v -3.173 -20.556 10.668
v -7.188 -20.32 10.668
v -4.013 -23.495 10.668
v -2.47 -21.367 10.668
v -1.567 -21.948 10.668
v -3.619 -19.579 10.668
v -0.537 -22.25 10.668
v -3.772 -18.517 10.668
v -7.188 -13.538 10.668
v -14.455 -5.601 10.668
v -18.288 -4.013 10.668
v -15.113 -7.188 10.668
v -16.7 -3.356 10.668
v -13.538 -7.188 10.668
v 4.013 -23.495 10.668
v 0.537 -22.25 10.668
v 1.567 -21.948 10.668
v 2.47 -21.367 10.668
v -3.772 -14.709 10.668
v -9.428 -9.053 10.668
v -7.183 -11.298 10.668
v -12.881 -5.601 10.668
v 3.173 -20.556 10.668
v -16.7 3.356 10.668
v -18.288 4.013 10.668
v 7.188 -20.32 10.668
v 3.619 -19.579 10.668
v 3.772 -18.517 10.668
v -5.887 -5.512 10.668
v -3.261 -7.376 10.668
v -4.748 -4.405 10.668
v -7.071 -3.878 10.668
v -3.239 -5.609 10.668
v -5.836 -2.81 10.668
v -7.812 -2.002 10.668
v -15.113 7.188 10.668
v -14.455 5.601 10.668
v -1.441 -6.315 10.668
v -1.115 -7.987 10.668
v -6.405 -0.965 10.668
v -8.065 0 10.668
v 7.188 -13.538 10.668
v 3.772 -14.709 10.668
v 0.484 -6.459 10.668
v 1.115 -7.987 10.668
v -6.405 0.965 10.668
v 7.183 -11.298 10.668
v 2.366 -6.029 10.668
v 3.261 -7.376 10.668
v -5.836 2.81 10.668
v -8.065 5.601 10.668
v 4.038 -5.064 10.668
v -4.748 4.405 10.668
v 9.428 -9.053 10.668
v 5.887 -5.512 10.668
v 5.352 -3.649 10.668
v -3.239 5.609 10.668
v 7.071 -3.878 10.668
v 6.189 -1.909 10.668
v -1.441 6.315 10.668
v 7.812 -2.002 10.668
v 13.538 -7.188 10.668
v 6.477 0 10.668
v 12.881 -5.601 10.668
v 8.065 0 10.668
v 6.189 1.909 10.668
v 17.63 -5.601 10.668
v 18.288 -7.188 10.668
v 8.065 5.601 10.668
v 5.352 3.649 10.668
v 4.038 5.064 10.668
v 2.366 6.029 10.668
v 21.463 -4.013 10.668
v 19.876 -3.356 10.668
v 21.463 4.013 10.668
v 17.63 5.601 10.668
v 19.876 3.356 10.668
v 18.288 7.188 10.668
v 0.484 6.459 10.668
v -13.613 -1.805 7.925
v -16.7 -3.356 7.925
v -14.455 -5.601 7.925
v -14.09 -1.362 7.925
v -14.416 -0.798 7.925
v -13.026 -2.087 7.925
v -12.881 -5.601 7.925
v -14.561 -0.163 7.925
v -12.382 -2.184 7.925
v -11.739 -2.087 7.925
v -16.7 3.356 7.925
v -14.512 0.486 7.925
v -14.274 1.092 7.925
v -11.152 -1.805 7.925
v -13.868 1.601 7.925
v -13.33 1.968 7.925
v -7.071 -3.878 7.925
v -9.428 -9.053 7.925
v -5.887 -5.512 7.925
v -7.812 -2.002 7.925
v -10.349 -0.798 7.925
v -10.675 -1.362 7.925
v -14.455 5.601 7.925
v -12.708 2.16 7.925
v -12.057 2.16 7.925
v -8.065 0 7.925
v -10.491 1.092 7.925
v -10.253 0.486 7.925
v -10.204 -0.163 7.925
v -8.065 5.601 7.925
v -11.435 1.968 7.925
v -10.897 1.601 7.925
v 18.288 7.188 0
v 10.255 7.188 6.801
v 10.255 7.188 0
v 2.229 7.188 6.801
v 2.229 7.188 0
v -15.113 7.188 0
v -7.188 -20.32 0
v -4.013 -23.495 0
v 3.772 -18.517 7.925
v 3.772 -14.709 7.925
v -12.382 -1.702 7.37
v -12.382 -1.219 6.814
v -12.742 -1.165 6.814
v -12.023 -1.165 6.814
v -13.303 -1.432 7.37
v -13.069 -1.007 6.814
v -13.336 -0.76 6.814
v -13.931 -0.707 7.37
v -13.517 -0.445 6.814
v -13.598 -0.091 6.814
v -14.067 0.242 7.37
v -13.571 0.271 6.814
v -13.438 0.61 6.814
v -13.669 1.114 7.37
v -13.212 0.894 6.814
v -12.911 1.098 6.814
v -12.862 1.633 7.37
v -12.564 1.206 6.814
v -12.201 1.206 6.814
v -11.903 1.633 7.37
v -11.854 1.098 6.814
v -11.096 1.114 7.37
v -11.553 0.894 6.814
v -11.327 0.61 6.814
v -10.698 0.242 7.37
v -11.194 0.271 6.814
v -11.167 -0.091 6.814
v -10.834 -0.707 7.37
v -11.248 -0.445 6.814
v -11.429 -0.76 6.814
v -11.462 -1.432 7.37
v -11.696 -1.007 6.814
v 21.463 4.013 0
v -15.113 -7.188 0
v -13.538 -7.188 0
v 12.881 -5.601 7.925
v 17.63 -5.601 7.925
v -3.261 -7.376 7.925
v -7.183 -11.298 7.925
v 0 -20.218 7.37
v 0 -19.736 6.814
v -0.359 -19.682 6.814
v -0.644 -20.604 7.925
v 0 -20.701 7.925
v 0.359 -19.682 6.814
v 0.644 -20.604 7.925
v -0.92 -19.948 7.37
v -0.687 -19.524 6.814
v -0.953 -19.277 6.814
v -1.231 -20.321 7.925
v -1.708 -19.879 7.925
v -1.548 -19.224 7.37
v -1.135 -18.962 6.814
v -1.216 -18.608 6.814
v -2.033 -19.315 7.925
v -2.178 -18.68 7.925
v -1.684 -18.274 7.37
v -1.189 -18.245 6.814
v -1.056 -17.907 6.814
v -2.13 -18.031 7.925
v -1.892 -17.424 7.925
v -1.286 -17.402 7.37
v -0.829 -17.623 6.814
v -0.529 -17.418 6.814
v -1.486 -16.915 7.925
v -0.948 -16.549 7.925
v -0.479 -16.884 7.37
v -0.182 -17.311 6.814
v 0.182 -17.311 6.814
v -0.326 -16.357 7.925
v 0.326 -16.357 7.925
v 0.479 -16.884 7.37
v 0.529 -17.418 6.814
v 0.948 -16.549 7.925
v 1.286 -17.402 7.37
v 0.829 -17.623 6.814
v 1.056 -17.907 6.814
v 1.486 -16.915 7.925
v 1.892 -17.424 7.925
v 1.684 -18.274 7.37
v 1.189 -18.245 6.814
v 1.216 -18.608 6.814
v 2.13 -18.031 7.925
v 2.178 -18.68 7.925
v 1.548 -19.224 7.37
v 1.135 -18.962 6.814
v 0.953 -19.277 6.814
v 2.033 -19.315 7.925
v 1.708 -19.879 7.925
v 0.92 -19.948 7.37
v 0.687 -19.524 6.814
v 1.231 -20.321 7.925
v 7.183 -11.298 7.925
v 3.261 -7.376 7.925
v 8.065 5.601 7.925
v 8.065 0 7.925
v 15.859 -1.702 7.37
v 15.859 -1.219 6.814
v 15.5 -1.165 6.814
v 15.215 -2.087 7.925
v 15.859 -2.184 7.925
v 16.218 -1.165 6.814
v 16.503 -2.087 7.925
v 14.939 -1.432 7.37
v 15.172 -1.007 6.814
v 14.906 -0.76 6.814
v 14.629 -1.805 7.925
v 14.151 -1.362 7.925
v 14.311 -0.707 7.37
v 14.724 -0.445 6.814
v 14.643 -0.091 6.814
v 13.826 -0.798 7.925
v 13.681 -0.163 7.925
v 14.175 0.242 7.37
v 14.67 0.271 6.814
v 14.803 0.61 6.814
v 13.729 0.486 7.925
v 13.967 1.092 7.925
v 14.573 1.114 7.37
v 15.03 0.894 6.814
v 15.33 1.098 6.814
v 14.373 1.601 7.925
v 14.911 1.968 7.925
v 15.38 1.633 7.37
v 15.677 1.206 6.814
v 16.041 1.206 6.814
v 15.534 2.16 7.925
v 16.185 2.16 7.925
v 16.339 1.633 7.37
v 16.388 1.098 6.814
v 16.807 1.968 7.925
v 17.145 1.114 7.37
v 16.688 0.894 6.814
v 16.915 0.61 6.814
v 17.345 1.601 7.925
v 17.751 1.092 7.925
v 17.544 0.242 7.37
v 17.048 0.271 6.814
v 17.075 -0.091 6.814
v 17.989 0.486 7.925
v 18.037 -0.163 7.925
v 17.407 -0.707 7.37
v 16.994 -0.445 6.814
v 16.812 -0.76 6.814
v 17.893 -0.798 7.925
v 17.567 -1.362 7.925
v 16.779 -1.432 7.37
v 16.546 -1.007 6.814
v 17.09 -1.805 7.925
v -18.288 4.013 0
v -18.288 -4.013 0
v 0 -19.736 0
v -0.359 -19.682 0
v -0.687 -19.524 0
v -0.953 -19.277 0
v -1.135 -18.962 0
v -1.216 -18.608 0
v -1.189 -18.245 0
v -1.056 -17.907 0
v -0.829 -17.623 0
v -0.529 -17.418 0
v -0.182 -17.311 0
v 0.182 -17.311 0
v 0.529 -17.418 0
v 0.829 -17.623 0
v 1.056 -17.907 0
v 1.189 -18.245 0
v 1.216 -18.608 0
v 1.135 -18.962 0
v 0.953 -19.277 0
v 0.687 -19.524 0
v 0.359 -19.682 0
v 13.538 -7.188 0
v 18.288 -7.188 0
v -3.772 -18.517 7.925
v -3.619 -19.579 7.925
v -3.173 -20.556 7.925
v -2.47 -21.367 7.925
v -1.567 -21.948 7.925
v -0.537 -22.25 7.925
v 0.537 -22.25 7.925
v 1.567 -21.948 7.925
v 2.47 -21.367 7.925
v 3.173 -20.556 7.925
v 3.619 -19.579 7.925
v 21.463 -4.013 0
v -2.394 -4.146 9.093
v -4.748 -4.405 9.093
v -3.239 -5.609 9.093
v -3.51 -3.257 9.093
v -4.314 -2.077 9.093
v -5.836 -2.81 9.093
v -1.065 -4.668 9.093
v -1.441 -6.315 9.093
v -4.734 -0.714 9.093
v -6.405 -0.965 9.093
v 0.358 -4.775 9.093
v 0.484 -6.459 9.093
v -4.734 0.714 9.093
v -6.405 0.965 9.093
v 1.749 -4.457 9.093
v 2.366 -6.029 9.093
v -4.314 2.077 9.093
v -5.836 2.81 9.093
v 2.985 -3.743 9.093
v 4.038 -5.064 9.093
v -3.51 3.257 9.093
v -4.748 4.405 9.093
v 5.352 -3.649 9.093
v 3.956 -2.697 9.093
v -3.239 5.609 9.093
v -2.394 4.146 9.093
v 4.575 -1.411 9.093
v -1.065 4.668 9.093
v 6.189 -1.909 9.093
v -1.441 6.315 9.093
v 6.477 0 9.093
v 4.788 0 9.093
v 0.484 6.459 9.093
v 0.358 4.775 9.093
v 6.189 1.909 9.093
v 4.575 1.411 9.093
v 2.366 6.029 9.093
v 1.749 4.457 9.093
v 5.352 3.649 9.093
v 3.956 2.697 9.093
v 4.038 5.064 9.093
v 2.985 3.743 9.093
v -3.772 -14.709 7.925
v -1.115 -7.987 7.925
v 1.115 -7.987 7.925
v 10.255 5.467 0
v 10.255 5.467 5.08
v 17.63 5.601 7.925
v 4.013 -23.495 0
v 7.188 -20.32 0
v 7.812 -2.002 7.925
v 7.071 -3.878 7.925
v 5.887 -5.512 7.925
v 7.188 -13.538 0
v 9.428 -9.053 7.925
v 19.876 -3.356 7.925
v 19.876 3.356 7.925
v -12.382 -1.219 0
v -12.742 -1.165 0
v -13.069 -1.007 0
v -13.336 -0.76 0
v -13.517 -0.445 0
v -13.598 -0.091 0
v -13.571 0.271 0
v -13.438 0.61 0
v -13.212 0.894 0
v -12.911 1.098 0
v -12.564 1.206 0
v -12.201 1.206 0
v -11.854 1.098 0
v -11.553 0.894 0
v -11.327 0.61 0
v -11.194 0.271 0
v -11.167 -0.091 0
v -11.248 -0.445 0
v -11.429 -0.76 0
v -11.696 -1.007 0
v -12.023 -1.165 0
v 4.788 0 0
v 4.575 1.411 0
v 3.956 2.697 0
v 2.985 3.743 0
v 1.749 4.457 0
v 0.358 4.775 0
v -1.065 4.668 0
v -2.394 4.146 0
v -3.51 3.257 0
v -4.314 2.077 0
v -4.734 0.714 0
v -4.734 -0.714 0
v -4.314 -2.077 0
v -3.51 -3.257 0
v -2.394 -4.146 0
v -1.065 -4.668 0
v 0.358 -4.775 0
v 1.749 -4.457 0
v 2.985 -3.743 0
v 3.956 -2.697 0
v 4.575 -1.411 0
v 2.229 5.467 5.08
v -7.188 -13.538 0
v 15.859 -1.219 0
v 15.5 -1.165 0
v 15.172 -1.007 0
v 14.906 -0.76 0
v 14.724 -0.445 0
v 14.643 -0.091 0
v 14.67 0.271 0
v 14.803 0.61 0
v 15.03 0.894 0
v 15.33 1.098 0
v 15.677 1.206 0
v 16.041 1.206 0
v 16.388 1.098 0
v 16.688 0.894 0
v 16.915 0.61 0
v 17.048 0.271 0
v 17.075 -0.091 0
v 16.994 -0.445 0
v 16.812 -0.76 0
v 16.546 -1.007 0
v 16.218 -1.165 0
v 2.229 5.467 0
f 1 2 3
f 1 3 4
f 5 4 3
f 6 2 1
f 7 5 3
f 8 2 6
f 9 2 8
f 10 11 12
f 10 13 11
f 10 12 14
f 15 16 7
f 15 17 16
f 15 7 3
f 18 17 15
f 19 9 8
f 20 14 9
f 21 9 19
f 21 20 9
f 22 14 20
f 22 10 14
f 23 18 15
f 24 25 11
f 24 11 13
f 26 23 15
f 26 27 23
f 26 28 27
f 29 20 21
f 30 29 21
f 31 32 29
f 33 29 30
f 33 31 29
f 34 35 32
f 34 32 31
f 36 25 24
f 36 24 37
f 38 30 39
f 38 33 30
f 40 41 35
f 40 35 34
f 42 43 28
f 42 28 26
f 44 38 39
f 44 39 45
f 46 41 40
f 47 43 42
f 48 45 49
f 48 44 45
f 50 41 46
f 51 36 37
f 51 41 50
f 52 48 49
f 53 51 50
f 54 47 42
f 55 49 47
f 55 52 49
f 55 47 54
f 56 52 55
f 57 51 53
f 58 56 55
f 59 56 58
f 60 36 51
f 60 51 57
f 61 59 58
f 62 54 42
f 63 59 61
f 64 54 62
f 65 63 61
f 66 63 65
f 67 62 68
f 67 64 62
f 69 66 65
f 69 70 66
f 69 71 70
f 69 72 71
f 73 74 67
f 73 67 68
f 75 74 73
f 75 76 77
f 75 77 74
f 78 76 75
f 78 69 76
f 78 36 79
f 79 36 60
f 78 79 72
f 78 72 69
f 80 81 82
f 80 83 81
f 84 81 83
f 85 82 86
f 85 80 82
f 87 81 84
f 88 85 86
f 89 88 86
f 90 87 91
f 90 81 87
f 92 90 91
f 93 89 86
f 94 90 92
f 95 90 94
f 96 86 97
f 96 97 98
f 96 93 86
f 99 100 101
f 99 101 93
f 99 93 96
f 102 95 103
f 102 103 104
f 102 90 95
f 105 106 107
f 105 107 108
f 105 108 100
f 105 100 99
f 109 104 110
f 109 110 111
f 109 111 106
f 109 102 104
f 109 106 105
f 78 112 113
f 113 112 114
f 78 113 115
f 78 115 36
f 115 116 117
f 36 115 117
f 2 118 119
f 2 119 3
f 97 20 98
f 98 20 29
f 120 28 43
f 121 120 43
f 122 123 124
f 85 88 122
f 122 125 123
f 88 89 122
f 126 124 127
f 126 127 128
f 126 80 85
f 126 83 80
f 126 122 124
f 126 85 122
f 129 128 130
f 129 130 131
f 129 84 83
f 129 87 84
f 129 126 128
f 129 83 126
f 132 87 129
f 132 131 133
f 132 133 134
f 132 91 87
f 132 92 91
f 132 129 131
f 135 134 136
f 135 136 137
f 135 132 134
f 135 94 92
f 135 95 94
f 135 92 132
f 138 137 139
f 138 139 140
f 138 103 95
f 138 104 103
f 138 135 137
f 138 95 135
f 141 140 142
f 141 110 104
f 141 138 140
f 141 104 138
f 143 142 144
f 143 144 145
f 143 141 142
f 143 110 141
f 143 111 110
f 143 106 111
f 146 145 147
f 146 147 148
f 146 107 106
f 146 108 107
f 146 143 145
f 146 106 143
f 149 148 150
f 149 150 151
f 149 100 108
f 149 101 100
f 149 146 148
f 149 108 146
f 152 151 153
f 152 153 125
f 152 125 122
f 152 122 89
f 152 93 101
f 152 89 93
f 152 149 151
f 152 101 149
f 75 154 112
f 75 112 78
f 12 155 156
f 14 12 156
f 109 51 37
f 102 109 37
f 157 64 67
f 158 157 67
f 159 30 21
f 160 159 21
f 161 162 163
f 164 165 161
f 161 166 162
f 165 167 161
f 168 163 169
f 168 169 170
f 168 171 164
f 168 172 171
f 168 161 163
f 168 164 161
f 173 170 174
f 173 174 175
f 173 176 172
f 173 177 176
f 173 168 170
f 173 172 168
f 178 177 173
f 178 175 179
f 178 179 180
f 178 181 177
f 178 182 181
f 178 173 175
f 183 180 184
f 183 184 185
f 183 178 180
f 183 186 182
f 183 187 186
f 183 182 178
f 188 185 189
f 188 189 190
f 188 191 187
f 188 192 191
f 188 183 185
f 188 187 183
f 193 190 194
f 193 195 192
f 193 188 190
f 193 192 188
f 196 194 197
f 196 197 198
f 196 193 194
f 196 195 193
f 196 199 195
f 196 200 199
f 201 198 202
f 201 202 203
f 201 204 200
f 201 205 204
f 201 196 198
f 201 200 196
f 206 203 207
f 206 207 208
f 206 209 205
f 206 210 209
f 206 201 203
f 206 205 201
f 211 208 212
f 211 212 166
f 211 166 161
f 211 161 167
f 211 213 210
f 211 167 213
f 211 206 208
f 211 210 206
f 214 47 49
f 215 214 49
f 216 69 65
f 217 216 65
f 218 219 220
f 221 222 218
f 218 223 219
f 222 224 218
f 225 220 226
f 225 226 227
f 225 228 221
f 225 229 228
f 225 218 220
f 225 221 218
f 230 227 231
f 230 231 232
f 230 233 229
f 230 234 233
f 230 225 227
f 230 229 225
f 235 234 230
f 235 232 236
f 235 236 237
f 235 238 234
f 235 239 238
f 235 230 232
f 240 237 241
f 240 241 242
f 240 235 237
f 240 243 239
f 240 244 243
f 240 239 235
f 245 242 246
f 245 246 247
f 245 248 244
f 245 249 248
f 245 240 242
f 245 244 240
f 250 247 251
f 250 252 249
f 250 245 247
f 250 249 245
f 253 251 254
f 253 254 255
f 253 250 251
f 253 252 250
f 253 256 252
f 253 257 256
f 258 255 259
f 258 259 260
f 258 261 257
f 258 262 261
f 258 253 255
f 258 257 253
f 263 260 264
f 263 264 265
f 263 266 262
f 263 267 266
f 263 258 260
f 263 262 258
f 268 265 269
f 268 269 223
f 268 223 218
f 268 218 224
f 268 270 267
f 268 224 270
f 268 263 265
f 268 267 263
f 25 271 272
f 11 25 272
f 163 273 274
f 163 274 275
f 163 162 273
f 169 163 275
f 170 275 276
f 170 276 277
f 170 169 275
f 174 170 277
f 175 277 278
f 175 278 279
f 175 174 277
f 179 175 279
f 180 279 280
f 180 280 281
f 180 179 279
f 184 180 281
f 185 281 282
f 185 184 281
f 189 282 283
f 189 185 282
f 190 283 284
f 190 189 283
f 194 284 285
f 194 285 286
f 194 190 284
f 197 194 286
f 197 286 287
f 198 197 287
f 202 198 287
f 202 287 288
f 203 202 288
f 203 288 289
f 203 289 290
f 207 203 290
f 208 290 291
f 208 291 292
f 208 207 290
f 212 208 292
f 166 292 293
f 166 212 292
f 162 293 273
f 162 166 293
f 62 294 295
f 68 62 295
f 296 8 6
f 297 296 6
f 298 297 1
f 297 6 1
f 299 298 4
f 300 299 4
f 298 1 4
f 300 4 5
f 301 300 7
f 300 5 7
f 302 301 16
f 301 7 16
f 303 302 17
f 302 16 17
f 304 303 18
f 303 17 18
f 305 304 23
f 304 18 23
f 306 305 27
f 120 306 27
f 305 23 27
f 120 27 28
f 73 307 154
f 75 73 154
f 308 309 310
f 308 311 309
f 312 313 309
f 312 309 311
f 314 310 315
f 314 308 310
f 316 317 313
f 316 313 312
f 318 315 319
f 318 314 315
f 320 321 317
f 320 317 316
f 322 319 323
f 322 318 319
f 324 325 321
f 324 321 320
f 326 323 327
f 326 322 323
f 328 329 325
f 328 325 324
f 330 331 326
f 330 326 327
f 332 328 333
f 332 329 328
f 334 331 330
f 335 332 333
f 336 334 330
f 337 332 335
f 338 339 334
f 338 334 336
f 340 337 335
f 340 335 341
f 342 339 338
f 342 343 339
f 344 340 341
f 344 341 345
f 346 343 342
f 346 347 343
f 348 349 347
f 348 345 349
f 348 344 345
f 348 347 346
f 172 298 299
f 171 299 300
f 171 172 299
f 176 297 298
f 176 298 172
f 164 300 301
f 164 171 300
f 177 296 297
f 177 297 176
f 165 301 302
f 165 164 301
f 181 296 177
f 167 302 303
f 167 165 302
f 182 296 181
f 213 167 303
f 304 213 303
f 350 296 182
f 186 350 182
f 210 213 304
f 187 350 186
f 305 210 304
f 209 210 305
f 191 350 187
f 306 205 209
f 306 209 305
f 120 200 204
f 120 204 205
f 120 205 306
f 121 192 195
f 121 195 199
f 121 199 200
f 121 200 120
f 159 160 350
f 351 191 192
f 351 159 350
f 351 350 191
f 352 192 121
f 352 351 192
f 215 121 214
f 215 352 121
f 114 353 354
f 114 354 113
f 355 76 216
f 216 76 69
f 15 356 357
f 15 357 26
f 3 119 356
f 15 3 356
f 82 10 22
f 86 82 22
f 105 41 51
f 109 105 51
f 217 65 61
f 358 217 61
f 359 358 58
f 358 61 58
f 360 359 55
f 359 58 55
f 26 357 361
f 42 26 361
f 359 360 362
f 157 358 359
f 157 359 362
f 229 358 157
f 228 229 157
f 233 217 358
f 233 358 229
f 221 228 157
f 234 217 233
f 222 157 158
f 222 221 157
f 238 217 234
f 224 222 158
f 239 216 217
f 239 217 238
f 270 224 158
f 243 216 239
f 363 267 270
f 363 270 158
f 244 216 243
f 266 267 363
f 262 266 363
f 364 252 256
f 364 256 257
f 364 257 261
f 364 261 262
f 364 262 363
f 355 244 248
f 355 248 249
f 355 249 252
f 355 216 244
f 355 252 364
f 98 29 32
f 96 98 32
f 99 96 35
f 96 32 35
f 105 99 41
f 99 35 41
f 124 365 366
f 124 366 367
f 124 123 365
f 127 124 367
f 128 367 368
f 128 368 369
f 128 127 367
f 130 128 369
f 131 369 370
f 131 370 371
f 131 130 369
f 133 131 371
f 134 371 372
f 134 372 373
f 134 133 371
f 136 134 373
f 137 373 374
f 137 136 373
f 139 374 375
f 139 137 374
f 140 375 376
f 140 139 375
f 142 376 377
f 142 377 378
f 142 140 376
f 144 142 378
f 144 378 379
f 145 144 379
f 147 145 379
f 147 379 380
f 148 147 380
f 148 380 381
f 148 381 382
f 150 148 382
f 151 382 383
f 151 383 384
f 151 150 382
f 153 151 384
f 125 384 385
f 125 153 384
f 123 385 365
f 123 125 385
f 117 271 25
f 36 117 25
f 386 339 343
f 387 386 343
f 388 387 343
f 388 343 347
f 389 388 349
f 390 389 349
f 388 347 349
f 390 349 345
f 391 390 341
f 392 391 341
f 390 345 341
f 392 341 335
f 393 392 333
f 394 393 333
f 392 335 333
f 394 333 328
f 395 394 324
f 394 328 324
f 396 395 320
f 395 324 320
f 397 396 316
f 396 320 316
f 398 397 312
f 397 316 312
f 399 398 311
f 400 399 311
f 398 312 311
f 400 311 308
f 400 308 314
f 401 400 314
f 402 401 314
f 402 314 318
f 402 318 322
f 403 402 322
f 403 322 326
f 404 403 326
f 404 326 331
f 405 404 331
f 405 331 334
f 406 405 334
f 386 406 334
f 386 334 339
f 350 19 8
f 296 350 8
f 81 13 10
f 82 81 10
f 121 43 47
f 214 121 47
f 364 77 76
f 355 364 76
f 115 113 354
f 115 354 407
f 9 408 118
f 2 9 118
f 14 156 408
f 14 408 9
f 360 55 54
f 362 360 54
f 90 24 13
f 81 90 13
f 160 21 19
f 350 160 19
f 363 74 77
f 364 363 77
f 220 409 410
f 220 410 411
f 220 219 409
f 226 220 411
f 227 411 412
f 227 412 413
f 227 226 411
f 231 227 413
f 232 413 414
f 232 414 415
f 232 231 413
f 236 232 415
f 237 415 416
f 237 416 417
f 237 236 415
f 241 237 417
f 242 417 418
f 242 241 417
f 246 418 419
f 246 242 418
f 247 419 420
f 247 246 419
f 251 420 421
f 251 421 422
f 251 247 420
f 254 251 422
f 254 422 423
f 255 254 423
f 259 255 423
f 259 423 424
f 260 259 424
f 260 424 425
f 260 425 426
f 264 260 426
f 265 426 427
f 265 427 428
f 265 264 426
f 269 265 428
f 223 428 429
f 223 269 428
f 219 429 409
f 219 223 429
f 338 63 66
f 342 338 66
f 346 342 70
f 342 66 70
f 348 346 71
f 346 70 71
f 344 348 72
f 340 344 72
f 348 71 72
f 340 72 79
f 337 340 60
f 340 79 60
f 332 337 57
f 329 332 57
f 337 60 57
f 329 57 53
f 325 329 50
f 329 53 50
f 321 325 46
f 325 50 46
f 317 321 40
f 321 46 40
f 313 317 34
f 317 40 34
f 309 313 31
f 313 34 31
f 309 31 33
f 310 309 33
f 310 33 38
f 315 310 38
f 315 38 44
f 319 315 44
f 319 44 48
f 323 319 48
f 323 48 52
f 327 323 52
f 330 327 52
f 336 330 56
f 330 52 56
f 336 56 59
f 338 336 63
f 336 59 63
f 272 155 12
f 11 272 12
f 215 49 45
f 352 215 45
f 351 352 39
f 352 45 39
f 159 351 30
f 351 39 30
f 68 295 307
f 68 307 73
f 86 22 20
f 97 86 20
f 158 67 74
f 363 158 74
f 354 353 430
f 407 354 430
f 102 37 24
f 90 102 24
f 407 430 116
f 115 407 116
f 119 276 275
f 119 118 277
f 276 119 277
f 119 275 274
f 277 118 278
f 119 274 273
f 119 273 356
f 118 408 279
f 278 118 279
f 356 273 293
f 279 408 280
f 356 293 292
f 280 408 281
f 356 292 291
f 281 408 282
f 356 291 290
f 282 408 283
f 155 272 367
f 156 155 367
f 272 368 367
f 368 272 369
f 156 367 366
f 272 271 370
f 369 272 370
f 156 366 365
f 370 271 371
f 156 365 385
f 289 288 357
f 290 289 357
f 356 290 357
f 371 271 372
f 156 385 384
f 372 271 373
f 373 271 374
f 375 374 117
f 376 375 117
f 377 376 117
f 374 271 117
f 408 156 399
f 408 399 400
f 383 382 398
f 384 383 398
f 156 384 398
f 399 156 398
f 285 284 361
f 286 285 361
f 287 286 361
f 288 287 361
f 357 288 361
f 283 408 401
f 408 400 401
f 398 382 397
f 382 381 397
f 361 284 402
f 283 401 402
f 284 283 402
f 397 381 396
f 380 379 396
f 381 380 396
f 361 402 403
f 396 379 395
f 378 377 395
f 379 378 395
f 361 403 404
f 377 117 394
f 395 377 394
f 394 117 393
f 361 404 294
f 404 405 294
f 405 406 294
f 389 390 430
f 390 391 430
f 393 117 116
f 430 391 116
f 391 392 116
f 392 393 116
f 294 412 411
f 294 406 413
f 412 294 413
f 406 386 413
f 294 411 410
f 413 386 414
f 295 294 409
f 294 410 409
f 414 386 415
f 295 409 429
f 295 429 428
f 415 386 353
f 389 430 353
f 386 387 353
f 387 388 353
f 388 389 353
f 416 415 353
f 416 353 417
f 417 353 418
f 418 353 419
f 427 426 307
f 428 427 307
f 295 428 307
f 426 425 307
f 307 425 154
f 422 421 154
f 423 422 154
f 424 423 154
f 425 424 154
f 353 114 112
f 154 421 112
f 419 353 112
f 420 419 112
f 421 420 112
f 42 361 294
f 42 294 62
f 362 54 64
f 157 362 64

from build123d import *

# Parameters (mm, degrees)
BOSS_EXTRUDE1_DEPTH                           = 10.668
CSK_FOR_2_FLAT_HEAD_MACHINE_SCREW1_AT_2_COUNT = 2
CSK_FOR_2_FLAT_HEAD_MACHINE_SCREW1_AT_2_PITCH = 28.241625
CSK_FOR_2_FLAT_HEAD_MACHINE_SCREW1_AT_3_COUNT = 2
CSK_FOR_2_FLAT_HEAD_MACHINE_SCREW1_AT_3_PITCH = 24.379834317
SKETCH4_R                                     = 6.477
CUT_EXTRUDE1_DEPTH                            = 1.5748
SKETCH5_R                                     = 4.7879
CUT_EXTRUDE2_DEPTH                            = 11.668
SKETCH6_W                                     = 8.0264
SKETCH6_H                                     = 10.033
CUT_EXTRUDE3_DEPTH                            = 5.08
DRAFT2_ANGLE                                  = 45
CHAMFER1_SIZE                                 = 3.175
CHAMFER2_SIZE                                 = 6.35
CUT_EXTRUDE4_DEPTH                            = 2.7432


with BuildPart() as part:
    # Sketch1 → Boss-Extrude1 (new body)
    with BuildSketch(Plane.XY):
        Polygon((21.463, 7.1882), (-18.288, 7.1882), (-18.288, -7.1882), (-7.1882, -7.1882), (-7.1882, -23.495), (7.1882, -23.495), (7.1882, -7.1882), (21.463, -7.1882), align=None)
    extrude(amount=BOSS_EXTRUDE1_DEPTH)

    # Sketch3 → CSK for #2 Flat Head Machine Screw1 (revolve, cut)
    with BuildSketch(Plane(origin=(15.859125, 0, 10.668), x_dir=(0, -1, 0), z_dir=(1, 0, 0))):
        Polygon((0, 0), (0, 10.668), (1.2192, 10.668), (1.2192, 3.853535587), (2.1844, 2.7432), (2.1844, 0), align=None)
    csk_for_2_flat_head_machine_screw1 = revolve(axis=Axis((15.859125, 0, 17.018), (0, 0, -1)), mode=Mode.SUBTRACT)

    # CSK for #2 Flat Head Machine Screw1 at 2: CSK for #2 Flat Head Machine Screw1 ×2
    with Locations(*[(-i * CSK_FOR_2_FLAT_HEAD_MACHINE_SCREW1_AT_2_PITCH, 0, 0) for i in range(1, CSK_FOR_2_FLAT_HEAD_MACHINE_SCREW1_AT_2_COUNT)]):
        add(csk_for_2_flat_head_machine_screw1, mode=Mode.SUBTRACT)

    # CSK for #2 Flat Head Machine Screw1 at 3: CSK for #2 Flat Head Machine Screw1 ×2
    with Locations(*[Vector(-0.650501755, -0.759504751, 0) * (i * CSK_FOR_2_FLAT_HEAD_MACHINE_SCREW1_AT_3_PITCH) for i in range(1, CSK_FOR_2_FLAT_HEAD_MACHINE_SCREW1_AT_3_COUNT)]):
        add(csk_for_2_flat_head_machine_screw1, mode=Mode.SUBTRACT)

    # Sketch4 → Cut-Extrude1 (cut)
    with BuildSketch(Plane.XY.offset(10.668)):
        Circle(SKETCH4_R)
    extrude(amount=-CUT_EXTRUDE1_DEPTH, mode=Mode.SUBTRACT)

    # Sketch5 → Cut-Extrude2 (cut, through all)
    with BuildSketch(Plane.XY.offset(10.668)):
        Circle(SKETCH5_R)
    extrude(amount=-CUT_EXTRUDE2_DEPTH, mode=Mode.SUBTRACT)

    # Sketch6 → Cut-Extrude3 (cut)
    with BuildSketch(Plane(origin=(0, 0, 0), x_dir=(-1, 0, 0), z_dir=(0, 0, -1))):
        with Locations((-6.24205, 10.483214746)):
            Rectangle(SKETCH6_W, SKETCH6_H)
    extrude(amount=-CUT_EXTRUDE3_DEPTH, mode=Mode.SUBTRACT)

    # Draft2
    draft2_faces = [part.faces().sort_by_distance(p)[0] for p in [
        (6.24205, 6.327457373, 5.08),
    ]]
    draft(draft2_faces, Plane(origin=(10.25525, 5.466714746, 5.08), x_dir=(1, 0, 0), z_dir=(0, 1, 0)), DRAFT2_ANGLE)

    # Chamfer1
    chamfer1_edges = [part.edges().sort_by_distance(p)[0] for p in [
        (21.463, -7.1882, 5.334),
        (7.1882, -23.495, 5.334),
        (-7.1882, -23.495, 5.334),
        (-18.288, -7.1882, 5.334),
        (-18.288, 7.1882, 5.334),
        (21.463, 7.1882, 5.334),
    ]]
    chamfer(chamfer1_edges, length=CHAMFER1_SIZE)

    # Chamfer2
    chamfer2_edges = [part.edges().sort_by_distance(p)[0] for p in [
        (7.1882, -7.1882, 5.334),
        (-7.1882, -7.1882, 5.334),
    ]]
    chamfer(chamfer2_edges, length=CHAMFER2_SIZE)

    # Sketch7 → Cut-Extrude4 (cut)
    with BuildSketch(Plane.XY.offset(10.668)):
        with BuildLine():
            Line((3.7719, -14.70943597), (7.183135951, -11.298200019))
            Line((7.183135951, -11.298200019), (3.260798724, -7.375862792))
            ThreePointArc((3.260798724, -7.375862792), (0, -8.0645), (-3.260798724, -7.375862792))
            Line((-3.260798724, -7.375862792), (-7.183135951, -11.298200019))
            Line((-7.183135951, -11.298200019), (-3.7719, -14.70943597))
            Line((-3.7719, -14.70943597), (-3.7719, -18.5166))
            ThreePointArc((-3.7719, -18.5166), (0, -22.2885), (3.7719, -18.5166))
            Line((3.7719, -18.5166), (3.7719, -14.70943597))
        make_face()
        with BuildLine():
            Line((12.88063597, -5.6007), (17.63043597, -5.6007))
            Line((17.63043597, -5.6007), (19.8755, -3.35563597))
            Line((19.8755, -3.35563597), (19.8755, 3.35563597))
            Line((19.8755, 3.35563597), (17.63043597, 5.6007))
            Line((17.63043597, 5.6007), (8.0645, 5.6007))
            Line((8.0645, 5.6007), (8.0645, 0))
            ThreePointArc((8.0645, 0), (7.500371575, -2.963205441), (5.886910197, -5.511846205))
            Line((5.886910197, -5.511846205), (9.428199981, -9.053135989))
            Line((9.428199981, -9.053135989), (12.88063597, -5.6007))
        make_face()
        with BuildLine():
            Line((-14.45543597, 5.6007), (-16.7005, 3.35563597))
            Line((-16.7005, 3.35563597), (-16.7005, -3.35563597))
            Line((-16.7005, -3.35563597), (-14.45543597, -5.6007))
            Line((-14.45543597, -5.6007), (-12.88063597, -5.6007))
            Line((-12.88063597, -5.6007), (-9.428199981, -9.053135989))
            Line((-9.428199981, -9.053135989), (-5.886910197, -5.511846205))
            ThreePointArc((-5.886910197, -5.511846205), (-7.500371575, -2.963205441), (-8.0645, 0))
            Line((-8.0645, 0), (-8.0645, 5.6007))
            Line((-8.0645, 5.6007), (-14.45543597, 5.6007))
        make_face()
    extrude(amount=-CUT_EXTRUDE4_DEPTH, mode=Mode.SUBTRACT)


solid = part.part
